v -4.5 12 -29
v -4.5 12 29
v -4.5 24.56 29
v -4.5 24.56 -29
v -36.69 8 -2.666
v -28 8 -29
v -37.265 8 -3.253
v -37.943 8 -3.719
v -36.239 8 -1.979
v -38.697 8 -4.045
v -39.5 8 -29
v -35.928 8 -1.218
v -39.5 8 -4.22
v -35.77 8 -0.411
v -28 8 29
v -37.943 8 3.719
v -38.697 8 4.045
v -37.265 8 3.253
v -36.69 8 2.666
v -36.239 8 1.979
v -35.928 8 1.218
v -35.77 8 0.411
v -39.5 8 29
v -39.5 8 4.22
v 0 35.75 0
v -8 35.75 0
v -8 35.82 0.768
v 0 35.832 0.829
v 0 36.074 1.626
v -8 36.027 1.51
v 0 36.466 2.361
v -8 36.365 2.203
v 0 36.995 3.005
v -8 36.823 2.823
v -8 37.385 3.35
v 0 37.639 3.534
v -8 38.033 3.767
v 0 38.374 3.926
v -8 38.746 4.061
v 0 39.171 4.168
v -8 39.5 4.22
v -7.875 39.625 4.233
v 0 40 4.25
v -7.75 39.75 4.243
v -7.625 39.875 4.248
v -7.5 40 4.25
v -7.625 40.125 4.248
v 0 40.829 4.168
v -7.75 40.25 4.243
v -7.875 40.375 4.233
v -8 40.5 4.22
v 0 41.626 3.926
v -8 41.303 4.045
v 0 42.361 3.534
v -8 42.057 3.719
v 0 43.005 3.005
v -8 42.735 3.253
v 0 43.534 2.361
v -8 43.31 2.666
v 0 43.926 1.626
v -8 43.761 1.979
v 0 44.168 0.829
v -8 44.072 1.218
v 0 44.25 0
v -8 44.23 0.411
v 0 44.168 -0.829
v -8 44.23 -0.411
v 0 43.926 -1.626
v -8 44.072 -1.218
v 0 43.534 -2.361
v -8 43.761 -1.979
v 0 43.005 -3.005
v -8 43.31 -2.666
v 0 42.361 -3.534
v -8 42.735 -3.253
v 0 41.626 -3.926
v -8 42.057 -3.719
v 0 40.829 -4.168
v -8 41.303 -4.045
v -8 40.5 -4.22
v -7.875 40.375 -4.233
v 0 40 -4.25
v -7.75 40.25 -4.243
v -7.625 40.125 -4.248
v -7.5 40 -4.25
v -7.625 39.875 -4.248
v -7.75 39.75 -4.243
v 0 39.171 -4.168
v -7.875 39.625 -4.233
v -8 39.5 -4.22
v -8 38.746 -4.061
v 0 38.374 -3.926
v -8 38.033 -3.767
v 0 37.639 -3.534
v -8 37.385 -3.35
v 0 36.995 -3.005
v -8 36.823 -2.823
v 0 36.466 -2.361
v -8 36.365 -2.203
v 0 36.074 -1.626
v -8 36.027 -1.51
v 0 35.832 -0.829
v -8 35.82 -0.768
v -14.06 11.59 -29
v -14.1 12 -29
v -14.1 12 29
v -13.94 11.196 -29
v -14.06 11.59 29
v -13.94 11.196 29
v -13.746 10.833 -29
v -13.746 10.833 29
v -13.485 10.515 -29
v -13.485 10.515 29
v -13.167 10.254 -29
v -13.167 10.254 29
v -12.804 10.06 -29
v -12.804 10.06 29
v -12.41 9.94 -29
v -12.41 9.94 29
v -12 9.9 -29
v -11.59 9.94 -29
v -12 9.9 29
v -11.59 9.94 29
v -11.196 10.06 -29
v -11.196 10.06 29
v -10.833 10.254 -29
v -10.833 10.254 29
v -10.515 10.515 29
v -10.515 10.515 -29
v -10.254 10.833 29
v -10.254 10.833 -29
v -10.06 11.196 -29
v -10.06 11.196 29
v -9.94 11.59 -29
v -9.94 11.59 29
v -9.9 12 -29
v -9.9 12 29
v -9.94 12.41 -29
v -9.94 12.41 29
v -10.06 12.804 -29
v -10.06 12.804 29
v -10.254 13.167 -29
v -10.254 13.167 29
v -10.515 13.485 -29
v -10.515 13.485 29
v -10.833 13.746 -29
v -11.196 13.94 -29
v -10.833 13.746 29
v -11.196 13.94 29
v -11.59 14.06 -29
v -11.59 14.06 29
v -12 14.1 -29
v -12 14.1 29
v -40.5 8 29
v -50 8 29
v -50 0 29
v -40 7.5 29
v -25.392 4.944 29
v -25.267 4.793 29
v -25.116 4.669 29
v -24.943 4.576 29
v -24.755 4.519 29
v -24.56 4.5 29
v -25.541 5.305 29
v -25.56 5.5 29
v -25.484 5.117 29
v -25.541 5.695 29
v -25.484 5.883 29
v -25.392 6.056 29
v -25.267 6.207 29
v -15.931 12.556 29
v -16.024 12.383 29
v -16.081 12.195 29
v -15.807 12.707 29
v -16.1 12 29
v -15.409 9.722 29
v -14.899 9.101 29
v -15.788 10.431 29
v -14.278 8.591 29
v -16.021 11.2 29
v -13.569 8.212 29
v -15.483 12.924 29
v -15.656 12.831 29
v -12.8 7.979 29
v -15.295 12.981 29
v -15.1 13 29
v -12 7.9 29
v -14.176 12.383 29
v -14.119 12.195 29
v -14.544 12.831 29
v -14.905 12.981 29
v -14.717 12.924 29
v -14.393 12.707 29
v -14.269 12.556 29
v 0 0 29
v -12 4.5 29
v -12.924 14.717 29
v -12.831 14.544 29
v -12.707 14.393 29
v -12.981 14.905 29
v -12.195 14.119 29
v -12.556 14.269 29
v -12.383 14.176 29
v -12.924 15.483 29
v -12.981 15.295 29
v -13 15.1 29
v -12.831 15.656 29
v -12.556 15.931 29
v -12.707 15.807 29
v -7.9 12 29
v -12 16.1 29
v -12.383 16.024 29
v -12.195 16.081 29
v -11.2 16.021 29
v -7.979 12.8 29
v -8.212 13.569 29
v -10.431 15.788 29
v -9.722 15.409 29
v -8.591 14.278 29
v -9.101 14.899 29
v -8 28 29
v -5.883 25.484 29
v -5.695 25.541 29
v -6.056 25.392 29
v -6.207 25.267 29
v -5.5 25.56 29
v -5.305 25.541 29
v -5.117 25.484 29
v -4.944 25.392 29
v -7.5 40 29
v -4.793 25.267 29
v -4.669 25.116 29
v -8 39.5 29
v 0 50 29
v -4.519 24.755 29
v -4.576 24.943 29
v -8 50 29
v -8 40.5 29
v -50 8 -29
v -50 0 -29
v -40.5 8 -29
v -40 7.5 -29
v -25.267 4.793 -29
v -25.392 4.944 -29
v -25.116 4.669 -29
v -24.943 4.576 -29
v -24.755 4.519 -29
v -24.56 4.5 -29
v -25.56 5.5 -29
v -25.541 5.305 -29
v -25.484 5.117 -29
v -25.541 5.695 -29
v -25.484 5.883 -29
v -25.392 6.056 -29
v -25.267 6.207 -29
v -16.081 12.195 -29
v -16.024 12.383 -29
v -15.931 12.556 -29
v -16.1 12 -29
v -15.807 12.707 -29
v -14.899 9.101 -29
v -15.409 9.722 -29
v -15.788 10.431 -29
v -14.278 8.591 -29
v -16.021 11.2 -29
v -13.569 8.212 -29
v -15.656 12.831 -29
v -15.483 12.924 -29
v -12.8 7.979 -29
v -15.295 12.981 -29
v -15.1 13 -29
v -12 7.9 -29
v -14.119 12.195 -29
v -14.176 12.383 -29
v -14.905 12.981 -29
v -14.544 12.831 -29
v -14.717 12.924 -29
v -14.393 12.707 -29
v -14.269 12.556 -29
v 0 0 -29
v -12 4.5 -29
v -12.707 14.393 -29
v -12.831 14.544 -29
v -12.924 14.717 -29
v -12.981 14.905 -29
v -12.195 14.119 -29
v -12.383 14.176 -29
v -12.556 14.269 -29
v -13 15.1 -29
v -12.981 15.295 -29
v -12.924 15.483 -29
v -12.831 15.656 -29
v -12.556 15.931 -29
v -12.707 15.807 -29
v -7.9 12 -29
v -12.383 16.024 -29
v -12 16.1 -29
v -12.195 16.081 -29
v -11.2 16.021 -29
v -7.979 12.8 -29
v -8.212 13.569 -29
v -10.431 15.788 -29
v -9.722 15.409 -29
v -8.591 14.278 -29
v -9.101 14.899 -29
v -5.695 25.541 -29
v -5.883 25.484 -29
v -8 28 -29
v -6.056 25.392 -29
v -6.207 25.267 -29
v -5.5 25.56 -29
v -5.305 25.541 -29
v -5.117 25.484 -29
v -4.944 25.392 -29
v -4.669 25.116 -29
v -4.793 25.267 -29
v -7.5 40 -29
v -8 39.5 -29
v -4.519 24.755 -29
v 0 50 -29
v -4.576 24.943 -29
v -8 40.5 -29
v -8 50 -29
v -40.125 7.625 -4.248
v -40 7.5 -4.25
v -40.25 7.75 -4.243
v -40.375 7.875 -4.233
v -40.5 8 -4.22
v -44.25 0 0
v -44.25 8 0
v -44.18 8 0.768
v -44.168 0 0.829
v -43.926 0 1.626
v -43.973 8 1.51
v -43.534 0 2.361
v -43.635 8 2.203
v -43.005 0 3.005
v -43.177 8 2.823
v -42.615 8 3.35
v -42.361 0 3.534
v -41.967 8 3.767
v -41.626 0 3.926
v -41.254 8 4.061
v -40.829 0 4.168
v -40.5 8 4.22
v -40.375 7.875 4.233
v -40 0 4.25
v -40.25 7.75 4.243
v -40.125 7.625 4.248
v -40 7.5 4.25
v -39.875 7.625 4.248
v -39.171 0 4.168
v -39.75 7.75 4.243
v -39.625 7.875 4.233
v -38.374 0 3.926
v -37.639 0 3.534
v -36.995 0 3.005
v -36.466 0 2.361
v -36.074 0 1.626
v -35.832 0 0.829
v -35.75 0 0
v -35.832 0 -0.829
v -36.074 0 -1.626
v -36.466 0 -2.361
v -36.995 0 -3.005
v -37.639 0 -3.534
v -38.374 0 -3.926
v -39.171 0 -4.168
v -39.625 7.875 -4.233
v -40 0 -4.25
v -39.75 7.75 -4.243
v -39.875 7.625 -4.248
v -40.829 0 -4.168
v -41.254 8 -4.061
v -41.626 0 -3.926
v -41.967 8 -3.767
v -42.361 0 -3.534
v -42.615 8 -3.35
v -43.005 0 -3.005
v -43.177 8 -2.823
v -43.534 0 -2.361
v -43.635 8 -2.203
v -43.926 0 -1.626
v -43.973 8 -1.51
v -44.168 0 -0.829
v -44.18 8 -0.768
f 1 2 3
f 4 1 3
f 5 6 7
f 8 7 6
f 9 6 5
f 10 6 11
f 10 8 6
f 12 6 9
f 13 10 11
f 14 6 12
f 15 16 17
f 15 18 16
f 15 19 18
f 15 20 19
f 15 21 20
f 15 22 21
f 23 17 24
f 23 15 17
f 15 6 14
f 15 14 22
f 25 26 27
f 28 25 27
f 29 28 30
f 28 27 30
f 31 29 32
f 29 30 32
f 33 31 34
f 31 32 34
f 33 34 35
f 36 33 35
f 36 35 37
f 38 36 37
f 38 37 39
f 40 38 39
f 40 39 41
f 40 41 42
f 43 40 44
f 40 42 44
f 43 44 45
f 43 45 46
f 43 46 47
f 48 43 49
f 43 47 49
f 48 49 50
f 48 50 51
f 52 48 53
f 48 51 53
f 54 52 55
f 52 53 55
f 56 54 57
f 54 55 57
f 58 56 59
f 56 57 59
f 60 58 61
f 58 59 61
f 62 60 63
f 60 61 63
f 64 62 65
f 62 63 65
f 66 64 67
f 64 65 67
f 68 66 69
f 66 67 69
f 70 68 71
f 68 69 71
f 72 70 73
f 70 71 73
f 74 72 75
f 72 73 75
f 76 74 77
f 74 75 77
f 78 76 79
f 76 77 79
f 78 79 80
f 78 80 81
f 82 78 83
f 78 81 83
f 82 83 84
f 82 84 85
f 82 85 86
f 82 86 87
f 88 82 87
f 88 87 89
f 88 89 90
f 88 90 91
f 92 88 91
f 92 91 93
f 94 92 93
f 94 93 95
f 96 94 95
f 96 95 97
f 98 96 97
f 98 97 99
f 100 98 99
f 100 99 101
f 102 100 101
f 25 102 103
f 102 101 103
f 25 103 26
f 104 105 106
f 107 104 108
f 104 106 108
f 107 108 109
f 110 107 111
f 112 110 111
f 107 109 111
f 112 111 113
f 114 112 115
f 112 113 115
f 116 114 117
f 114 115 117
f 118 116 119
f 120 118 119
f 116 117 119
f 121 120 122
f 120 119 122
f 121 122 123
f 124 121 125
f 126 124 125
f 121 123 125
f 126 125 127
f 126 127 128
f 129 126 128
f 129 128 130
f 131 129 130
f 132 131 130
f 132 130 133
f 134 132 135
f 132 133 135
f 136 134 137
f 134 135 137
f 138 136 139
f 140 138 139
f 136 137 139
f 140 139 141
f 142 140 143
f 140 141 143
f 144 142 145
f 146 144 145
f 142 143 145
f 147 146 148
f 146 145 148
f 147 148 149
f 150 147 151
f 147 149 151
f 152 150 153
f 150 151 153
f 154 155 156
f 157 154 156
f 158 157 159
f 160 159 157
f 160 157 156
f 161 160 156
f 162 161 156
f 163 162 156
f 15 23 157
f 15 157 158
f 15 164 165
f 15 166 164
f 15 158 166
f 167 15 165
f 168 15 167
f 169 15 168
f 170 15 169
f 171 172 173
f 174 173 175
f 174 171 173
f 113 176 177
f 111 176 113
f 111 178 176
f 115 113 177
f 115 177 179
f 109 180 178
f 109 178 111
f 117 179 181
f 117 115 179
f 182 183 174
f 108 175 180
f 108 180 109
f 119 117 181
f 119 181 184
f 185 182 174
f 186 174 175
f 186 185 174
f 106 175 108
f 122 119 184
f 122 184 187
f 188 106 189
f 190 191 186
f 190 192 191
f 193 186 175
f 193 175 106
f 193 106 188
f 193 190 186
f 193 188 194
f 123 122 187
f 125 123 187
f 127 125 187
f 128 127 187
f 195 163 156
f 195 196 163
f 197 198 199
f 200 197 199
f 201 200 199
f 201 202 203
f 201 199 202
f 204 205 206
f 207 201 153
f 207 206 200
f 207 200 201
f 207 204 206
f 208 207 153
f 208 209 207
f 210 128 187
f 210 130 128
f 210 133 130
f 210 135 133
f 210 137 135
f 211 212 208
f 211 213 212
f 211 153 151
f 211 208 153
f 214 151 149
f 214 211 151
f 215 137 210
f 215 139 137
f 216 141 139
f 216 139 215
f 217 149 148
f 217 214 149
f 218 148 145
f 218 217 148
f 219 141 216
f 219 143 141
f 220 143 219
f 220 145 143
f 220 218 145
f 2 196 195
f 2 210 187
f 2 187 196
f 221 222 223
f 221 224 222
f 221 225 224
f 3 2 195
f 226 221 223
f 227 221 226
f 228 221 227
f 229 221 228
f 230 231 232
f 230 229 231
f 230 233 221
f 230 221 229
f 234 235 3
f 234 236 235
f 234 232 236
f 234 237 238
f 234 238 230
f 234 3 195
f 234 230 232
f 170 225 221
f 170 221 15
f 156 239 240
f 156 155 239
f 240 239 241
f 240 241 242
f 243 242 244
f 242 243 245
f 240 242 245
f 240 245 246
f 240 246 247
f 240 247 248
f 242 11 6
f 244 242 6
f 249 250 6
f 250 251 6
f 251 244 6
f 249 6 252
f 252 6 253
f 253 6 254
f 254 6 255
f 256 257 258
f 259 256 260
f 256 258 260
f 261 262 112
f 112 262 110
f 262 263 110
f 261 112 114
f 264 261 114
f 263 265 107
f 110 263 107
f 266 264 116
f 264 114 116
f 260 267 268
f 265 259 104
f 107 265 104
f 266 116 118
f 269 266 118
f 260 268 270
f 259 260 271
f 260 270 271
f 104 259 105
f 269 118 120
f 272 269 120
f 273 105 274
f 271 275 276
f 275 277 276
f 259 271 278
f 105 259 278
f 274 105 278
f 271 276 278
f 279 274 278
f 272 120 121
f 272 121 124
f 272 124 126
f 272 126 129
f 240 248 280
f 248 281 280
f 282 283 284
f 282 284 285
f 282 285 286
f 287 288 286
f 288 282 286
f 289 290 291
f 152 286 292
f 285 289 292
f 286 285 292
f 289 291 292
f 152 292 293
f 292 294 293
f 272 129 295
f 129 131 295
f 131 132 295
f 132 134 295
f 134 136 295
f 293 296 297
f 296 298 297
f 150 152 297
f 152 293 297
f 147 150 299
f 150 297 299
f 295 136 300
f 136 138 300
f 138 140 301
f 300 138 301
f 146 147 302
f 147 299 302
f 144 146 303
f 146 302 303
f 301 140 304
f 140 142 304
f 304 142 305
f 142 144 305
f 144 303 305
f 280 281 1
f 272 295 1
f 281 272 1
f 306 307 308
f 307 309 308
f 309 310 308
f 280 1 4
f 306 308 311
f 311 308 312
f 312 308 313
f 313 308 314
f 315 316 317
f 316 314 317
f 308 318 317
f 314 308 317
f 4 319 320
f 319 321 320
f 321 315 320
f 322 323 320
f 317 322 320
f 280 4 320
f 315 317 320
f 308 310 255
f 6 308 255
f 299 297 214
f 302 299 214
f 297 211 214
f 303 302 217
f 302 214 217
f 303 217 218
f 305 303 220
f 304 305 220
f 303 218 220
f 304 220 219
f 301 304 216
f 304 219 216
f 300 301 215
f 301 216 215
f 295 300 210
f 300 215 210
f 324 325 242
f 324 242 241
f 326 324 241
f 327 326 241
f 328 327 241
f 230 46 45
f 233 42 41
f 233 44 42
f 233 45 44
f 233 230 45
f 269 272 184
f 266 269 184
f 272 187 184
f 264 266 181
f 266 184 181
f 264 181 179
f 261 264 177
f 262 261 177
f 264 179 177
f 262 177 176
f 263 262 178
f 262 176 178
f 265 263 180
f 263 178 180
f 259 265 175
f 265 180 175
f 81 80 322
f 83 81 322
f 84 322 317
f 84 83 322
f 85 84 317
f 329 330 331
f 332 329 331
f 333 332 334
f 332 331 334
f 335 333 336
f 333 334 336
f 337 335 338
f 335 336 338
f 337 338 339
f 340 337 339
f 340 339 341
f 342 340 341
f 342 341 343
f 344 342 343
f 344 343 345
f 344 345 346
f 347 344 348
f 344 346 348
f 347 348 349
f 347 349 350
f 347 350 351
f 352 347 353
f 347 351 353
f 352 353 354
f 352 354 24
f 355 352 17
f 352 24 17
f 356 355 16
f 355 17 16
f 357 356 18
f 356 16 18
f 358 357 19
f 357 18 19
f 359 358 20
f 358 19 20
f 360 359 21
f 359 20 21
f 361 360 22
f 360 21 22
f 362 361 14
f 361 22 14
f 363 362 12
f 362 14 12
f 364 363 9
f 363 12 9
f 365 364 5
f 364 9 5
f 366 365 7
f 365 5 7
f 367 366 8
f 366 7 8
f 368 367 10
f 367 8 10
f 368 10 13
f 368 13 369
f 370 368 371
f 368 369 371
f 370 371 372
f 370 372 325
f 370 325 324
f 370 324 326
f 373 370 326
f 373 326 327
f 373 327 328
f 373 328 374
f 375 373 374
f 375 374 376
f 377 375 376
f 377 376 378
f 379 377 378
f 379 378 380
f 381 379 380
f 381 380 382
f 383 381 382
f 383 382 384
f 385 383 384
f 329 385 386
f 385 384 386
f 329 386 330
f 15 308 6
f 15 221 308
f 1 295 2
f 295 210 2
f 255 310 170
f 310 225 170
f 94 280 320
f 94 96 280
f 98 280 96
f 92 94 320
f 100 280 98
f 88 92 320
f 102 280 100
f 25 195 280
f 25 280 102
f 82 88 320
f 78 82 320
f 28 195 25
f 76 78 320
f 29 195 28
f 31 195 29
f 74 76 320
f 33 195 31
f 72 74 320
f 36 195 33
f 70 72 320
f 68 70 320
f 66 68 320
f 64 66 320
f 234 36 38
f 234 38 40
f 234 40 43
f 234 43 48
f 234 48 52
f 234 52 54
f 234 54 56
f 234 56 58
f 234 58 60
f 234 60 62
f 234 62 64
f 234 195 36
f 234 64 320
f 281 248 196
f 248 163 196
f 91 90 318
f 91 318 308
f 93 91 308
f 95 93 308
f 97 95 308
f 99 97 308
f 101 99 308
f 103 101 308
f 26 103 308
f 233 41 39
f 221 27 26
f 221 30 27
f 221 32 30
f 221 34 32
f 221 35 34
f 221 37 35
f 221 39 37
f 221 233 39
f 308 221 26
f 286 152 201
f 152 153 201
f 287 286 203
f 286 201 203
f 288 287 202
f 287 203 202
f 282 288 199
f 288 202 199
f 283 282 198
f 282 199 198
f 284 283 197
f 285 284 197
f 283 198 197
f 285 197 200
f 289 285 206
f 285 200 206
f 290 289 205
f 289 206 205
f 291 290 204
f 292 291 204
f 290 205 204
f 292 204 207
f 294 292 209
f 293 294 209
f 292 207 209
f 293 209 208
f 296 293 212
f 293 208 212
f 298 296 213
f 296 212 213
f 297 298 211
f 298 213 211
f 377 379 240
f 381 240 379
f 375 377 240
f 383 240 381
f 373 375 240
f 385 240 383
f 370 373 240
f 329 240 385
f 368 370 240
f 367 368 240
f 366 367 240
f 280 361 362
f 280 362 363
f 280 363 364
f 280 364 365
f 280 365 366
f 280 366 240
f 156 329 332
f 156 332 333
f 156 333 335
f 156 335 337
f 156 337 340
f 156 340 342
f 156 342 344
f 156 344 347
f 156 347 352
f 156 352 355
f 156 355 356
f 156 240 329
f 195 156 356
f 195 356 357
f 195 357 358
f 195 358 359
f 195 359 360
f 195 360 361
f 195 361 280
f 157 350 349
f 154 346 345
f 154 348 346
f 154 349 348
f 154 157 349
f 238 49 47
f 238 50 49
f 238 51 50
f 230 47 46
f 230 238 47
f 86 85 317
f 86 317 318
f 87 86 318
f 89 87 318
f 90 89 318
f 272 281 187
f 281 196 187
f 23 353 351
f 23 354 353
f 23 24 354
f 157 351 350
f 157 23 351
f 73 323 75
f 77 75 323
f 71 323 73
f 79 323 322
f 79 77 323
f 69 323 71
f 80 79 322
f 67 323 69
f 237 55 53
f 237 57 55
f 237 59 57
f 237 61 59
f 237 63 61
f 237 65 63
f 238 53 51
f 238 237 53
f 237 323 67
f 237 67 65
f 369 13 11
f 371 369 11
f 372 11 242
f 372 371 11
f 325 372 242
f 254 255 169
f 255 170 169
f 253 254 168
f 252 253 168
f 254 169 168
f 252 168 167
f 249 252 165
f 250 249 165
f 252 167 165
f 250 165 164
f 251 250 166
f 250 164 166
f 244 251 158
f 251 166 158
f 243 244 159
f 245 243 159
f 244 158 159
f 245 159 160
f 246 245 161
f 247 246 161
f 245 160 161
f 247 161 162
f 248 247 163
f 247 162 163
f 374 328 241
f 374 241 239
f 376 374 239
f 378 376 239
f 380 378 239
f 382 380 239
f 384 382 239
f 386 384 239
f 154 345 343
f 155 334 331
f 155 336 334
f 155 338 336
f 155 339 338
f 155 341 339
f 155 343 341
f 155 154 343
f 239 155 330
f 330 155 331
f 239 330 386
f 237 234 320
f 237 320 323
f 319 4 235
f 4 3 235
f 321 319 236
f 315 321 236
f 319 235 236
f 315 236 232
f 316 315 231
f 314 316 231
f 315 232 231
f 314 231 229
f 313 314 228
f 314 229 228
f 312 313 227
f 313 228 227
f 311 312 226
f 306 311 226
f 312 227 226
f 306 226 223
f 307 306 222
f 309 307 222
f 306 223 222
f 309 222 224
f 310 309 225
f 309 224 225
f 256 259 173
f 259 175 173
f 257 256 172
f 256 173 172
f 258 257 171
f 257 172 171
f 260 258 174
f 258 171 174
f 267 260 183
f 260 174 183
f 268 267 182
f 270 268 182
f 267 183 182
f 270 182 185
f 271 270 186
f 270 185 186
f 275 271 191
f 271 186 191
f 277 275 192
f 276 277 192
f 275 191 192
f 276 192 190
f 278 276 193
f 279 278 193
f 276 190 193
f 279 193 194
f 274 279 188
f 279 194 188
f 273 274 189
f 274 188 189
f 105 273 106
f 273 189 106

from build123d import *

# Parameters (mm, degrees)
EXTRUDE_1_DEPTH     = 29
SKETCH_2_R          = 4.25
CUT_EXTRUDE_1_DEPTH = 9
SKETCH_3_R          = 4.25
CUT_EXTRUDE_2_DEPTH = 9


with BuildPart() as part:
    # Эскиз1 → Бобышка-Вытянуть1 (new body, symmetric)
    with BuildSketch(Plane.XY):
        Polygon((-50, 0), (0, 0), (0, 50), (-8, 50), (-8, 40.5), (-7.5, 40), (-8, 39.5), (-8, 28), (-28, 8), (-39.5, 8), (-40, 7.5), (-40.5, 8), (-50, 8), align=None)
        with BuildLine():
            Line((-4.5, 12), (-4.5, 24.560303038))
            ThreePointArc((-4.5, 24.560303038), (-5.117316568, 25.484182571), (-6.207106781, 25.267409819))
            Line((-6.207106781, 25.267409819), (-25.267409819, 6.207106781))
            ThreePointArc((-25.267409819, 6.207106781), (-25.484182571, 5.117316568), (-24.560303038, 4.5))
            Line((-24.560303038, 4.5), (-12, 4.5))
            Line((-12, 4.5), (-12, 7.9))
            ThreePointArc((-12, 7.9), (-14.899137803, 9.100862197), (-16.1, 12))
            ThreePointArc((-16.1, 12), (-15.1, 13), (-14.1, 12))
            ThreePointArc((-14.1, 12), (-10.51507576, 10.51507576), (-12, 14.1))
            ThreePointArc((-12, 14.1), (-13, 15.1), (-12, 16.1))
            ThreePointArc((-12, 16.1), (-9.100862197, 14.899137803), (-7.9, 12))
            Line((-7.9, 12), (-4.5, 12))
        make_face(mode=Mode.SUBTRACT)
    extrude(amount=EXTRUDE_1_DEPTH, both=True)

    # Эскиз2 → Вырез-Вытянуть1 (cut, through all)
    with BuildSketch(Plane.ZY.offset(8)):
        with Locations(Location((0, 40, 0), (0, 0, 270))):  # turned: the seam where the file's is
            Circle(SKETCH_2_R)
    extrude(amount=-CUT_EXTRUDE_1_DEPTH, mode=Mode.SUBTRACT)

    # Эскиз3 → Вырез-Вытянуть2 (cut, through all)
    with BuildSketch(Plane(origin=(0, 8, 0), x_dir=(1, 0, 0), z_dir=(0, 1, 0))):
        with Locations(Location((-40, 0, 0), (0, 0, 180))):  # turned: the seam where the file's is
            Circle(SKETCH_3_R)
    extrude(amount=-CUT_EXTRUDE_2_DEPTH, mode=Mode.SUBTRACT)


solid = part.part
